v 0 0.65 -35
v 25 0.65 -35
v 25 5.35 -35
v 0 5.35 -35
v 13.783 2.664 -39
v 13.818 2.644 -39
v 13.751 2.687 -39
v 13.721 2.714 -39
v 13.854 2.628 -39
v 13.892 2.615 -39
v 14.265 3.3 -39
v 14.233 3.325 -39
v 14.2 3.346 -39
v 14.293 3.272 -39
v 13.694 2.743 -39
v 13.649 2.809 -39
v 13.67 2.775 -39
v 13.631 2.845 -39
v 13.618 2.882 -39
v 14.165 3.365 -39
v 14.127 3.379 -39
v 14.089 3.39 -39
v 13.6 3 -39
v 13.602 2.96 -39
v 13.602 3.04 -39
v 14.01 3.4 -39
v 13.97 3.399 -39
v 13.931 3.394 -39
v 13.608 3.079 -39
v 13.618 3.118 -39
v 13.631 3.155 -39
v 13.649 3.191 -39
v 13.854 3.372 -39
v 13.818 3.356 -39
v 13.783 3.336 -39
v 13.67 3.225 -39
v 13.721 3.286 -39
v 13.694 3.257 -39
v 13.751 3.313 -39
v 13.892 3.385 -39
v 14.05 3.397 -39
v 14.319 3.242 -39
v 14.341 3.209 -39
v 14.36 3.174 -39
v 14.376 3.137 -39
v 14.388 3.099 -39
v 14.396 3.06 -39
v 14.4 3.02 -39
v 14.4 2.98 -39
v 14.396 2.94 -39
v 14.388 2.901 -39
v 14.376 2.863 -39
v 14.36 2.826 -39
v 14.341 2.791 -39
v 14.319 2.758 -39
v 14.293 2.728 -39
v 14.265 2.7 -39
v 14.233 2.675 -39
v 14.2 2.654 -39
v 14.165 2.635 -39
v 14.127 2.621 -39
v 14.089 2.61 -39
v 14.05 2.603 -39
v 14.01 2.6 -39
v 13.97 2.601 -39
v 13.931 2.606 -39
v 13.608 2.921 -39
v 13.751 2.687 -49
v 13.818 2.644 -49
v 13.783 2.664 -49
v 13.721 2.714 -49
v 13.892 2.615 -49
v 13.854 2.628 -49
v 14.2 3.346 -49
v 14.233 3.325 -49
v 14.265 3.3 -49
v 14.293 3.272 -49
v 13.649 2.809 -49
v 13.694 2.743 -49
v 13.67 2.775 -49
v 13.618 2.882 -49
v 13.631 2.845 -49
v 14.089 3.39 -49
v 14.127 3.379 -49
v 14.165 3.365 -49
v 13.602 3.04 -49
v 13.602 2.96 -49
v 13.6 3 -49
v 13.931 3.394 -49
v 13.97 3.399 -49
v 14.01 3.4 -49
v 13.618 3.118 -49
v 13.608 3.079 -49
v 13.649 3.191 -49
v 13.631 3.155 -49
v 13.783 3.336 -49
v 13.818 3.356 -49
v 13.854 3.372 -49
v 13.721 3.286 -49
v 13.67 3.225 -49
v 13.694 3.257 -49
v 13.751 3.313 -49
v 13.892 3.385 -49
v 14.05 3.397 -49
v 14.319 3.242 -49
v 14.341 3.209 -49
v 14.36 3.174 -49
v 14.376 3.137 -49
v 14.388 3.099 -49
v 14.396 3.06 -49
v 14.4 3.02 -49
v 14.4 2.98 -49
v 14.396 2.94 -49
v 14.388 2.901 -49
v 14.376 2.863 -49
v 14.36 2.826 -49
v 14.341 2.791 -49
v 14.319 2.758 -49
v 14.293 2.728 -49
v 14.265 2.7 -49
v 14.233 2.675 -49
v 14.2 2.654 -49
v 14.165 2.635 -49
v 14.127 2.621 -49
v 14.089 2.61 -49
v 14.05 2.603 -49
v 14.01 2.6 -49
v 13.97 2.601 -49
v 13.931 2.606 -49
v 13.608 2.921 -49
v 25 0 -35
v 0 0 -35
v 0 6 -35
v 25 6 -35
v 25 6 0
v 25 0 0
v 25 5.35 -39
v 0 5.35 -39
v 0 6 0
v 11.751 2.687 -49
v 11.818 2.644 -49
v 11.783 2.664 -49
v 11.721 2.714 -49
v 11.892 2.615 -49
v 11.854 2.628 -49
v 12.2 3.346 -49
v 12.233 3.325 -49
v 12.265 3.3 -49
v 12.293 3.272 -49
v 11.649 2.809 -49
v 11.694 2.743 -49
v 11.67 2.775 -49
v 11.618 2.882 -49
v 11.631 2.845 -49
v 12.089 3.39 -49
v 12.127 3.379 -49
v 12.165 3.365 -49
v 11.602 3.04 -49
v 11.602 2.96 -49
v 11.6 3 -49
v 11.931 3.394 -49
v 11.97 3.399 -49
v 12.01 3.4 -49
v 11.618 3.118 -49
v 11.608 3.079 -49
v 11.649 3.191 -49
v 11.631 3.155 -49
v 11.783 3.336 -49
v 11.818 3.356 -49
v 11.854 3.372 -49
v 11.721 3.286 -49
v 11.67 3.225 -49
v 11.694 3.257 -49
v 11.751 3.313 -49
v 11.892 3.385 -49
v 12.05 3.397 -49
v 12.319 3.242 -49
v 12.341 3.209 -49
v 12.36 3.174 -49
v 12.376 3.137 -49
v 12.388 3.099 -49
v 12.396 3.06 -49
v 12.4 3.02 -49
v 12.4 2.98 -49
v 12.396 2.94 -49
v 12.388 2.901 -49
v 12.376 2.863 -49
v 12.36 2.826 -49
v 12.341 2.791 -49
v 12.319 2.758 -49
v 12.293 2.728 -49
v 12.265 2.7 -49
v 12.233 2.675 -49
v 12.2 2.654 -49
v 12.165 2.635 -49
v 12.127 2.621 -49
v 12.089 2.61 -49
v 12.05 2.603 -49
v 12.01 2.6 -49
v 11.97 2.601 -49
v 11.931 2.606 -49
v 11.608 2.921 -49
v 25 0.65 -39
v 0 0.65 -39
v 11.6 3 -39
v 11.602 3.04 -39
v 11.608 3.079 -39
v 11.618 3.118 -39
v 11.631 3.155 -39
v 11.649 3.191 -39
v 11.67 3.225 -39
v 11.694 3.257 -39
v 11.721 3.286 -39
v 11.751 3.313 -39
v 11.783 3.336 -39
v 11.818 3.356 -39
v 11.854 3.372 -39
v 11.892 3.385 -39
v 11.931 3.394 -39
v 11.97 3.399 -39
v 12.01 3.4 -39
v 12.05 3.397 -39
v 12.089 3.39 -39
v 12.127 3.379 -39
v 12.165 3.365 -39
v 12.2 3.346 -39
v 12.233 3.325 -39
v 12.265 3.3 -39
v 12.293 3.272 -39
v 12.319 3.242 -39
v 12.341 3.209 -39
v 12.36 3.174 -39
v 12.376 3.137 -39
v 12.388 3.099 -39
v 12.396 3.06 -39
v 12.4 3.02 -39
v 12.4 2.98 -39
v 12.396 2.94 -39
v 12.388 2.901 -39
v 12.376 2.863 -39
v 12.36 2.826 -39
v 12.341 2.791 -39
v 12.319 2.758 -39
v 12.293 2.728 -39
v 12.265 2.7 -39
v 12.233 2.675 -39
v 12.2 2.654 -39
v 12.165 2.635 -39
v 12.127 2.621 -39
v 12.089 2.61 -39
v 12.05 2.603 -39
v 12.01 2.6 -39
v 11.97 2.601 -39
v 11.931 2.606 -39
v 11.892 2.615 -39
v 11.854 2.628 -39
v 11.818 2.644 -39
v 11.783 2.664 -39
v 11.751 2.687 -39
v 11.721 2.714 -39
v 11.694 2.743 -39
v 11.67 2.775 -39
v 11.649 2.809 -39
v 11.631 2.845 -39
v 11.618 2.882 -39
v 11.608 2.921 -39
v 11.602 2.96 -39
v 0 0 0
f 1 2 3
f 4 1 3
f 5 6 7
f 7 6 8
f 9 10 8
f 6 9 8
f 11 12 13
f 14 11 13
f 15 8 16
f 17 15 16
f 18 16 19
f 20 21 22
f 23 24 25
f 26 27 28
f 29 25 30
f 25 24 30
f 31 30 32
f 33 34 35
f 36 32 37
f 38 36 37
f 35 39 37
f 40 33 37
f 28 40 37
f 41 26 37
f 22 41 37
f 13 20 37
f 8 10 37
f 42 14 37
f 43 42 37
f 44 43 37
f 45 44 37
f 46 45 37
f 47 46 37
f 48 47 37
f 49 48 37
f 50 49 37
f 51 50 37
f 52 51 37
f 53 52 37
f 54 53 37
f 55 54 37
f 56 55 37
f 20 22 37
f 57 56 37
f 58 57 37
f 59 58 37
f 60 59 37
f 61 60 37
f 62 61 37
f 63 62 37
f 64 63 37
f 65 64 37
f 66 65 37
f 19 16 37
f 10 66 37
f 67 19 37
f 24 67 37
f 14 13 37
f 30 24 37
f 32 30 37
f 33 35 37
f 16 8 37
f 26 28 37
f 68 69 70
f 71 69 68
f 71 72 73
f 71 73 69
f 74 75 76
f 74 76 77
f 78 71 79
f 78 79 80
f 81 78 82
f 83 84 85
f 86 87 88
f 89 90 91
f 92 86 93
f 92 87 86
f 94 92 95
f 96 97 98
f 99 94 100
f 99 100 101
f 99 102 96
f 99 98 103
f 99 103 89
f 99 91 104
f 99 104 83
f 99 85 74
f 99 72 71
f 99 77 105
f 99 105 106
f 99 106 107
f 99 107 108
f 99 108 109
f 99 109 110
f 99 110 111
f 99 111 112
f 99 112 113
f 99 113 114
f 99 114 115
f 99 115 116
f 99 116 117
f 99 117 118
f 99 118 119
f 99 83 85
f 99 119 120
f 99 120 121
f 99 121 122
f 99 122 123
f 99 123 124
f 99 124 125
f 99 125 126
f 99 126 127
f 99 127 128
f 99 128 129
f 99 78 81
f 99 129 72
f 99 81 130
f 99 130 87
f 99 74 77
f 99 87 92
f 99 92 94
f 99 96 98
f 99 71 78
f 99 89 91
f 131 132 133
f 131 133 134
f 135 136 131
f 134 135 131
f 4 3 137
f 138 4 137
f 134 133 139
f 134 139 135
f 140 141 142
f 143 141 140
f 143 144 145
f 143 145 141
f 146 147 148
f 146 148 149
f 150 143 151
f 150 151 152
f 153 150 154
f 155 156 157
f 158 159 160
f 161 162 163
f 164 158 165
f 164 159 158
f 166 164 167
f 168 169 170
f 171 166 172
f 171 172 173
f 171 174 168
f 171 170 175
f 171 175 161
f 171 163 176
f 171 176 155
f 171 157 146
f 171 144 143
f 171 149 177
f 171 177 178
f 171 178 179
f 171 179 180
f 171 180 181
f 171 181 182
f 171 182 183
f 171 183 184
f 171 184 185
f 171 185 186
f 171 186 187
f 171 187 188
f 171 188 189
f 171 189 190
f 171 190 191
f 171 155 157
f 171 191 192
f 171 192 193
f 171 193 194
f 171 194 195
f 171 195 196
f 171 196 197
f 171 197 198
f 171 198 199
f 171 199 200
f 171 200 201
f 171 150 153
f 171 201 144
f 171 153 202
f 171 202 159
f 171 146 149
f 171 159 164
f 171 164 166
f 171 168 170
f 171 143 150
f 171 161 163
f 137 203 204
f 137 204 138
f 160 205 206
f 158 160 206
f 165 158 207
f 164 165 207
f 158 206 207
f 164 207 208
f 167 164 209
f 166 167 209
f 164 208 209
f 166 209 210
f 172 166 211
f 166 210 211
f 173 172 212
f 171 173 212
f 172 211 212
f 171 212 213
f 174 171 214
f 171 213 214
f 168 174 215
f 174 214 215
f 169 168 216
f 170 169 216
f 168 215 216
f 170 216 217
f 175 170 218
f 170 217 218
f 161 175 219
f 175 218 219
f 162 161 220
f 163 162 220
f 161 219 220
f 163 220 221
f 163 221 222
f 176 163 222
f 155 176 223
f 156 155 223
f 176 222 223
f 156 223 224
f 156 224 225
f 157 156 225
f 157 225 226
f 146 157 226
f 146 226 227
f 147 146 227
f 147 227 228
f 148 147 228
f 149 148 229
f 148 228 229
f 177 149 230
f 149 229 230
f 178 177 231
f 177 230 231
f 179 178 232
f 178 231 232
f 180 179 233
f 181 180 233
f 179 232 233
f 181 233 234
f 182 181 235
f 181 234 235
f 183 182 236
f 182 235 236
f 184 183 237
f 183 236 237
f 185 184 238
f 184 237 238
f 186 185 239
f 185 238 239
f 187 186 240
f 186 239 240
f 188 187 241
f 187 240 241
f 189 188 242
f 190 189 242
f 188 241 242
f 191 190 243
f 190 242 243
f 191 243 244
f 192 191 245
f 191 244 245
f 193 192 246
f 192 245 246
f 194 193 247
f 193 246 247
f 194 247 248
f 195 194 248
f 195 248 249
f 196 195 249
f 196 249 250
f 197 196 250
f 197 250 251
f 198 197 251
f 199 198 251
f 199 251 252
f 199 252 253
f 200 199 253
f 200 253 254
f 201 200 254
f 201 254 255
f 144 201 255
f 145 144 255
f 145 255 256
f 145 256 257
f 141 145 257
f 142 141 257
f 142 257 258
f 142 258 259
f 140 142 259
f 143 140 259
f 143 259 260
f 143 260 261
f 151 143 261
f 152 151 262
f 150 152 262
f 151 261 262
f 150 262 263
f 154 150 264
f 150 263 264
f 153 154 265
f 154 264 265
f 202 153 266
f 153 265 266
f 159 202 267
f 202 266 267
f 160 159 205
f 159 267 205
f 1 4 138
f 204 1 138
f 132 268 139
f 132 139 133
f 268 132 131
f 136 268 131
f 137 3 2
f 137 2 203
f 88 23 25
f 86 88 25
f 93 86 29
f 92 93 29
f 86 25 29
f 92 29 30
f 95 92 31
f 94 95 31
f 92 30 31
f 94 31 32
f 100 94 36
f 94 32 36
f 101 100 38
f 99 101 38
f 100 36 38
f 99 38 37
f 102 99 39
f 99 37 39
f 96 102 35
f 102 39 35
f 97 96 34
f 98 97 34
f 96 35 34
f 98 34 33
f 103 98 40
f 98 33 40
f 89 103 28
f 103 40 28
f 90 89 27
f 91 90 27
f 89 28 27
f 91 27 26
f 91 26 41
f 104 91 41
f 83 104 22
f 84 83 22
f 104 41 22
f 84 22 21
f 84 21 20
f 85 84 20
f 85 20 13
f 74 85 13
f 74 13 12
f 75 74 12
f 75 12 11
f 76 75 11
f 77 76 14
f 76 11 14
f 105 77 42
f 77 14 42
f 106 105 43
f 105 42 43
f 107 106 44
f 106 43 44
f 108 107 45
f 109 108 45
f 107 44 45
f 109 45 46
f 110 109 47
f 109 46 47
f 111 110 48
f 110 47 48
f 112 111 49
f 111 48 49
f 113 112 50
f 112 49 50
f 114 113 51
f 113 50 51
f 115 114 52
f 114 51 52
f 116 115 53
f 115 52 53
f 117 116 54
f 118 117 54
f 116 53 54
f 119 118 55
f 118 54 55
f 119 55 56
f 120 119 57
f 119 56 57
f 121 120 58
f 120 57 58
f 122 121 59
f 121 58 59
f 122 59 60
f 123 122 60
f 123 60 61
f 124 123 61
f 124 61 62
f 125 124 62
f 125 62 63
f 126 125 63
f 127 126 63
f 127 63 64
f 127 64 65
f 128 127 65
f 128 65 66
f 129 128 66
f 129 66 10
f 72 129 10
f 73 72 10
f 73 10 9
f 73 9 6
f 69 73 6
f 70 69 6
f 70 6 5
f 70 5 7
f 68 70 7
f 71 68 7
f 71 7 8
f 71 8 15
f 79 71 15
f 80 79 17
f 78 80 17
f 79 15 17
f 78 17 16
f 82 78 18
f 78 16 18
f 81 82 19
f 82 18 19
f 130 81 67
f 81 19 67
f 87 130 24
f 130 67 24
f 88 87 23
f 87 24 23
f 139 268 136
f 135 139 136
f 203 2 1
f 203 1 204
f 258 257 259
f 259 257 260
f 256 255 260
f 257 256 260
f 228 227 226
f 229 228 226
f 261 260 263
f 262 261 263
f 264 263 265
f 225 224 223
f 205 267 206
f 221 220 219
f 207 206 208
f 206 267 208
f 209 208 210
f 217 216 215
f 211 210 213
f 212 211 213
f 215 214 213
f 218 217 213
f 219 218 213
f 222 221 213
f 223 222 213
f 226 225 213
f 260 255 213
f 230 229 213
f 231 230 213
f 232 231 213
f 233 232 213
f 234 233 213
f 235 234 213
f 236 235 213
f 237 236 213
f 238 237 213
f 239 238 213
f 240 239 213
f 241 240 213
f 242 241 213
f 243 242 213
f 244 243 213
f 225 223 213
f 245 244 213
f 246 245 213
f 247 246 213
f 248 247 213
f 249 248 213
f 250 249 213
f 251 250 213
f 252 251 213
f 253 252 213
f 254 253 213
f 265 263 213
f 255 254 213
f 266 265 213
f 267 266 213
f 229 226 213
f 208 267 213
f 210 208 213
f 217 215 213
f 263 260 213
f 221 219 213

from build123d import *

# Parameters (mm, degrees)
SKETCH1_W             = 25
SKETCH1_H             = 35
BOSS_EXTRUDE1_DEPTH   = 6
SKETCH2_W             = 4
SKETCH2_H             = 4.7
BOSS_EXTRUDE2_DEPTH   = 25
SKETCH3_R             = 0.4
BOSS_EXTRUDE3_DEPTH   = 10
BOSS_EXTRUDE3_2_DEPTH = 10


with BuildPart() as part:
    # Sketch1 → Boss-Extrude1 (new body)
    with BuildSketch(Plane(origin=(0, 0, 0), x_dir=(1, 0, 0), z_dir=(0, 1, 0))):
        with Locations((12.5, 17.5)):
            Rectangle(SKETCH1_W, SKETCH1_H)
    extrude(amount=BOSS_EXTRUDE1_DEPTH)


with BuildPart() as body_2:
    # Sketch2 → Boss-Extrude2 (new body)
    with BuildSketch(Plane(origin=(25, 0, 0), x_dir=(0, 0, -1), z_dir=(1, 0, 0))):
        with Locations((37, 3)):
            Rectangle(SKETCH2_W, SKETCH2_H)
    extrude(amount=-BOSS_EXTRUDE2_DEPTH)


with BuildPart() as body_3:
    # Sketch3 → Boss-Extrude3 (new body)
    with BuildSketch(Plane(origin=(0, 0, -39), x_dir=(-1, 0, 0), z_dir=(0, 0, -1))):
        with Locations((-14, 3)):
            Circle(SKETCH3_R)
    extrude(amount=BOSS_EXTRUDE3_DEPTH)


with BuildPart() as body_4:
    # Sketch3 → Boss-Extrude3 2 (new body)
    with BuildSketch(Plane(origin=(0, 0, -39), x_dir=(-1, 0, 0), z_dir=(0, 0, -1))):
        with Locations((-12, 3)):
            Circle(SKETCH3_R)
    extrude(amount=BOSS_EXTRUDE3_2_DEPTH)


solid = Compound([part.part, body_2.part, body_3.part, body_4.part])
